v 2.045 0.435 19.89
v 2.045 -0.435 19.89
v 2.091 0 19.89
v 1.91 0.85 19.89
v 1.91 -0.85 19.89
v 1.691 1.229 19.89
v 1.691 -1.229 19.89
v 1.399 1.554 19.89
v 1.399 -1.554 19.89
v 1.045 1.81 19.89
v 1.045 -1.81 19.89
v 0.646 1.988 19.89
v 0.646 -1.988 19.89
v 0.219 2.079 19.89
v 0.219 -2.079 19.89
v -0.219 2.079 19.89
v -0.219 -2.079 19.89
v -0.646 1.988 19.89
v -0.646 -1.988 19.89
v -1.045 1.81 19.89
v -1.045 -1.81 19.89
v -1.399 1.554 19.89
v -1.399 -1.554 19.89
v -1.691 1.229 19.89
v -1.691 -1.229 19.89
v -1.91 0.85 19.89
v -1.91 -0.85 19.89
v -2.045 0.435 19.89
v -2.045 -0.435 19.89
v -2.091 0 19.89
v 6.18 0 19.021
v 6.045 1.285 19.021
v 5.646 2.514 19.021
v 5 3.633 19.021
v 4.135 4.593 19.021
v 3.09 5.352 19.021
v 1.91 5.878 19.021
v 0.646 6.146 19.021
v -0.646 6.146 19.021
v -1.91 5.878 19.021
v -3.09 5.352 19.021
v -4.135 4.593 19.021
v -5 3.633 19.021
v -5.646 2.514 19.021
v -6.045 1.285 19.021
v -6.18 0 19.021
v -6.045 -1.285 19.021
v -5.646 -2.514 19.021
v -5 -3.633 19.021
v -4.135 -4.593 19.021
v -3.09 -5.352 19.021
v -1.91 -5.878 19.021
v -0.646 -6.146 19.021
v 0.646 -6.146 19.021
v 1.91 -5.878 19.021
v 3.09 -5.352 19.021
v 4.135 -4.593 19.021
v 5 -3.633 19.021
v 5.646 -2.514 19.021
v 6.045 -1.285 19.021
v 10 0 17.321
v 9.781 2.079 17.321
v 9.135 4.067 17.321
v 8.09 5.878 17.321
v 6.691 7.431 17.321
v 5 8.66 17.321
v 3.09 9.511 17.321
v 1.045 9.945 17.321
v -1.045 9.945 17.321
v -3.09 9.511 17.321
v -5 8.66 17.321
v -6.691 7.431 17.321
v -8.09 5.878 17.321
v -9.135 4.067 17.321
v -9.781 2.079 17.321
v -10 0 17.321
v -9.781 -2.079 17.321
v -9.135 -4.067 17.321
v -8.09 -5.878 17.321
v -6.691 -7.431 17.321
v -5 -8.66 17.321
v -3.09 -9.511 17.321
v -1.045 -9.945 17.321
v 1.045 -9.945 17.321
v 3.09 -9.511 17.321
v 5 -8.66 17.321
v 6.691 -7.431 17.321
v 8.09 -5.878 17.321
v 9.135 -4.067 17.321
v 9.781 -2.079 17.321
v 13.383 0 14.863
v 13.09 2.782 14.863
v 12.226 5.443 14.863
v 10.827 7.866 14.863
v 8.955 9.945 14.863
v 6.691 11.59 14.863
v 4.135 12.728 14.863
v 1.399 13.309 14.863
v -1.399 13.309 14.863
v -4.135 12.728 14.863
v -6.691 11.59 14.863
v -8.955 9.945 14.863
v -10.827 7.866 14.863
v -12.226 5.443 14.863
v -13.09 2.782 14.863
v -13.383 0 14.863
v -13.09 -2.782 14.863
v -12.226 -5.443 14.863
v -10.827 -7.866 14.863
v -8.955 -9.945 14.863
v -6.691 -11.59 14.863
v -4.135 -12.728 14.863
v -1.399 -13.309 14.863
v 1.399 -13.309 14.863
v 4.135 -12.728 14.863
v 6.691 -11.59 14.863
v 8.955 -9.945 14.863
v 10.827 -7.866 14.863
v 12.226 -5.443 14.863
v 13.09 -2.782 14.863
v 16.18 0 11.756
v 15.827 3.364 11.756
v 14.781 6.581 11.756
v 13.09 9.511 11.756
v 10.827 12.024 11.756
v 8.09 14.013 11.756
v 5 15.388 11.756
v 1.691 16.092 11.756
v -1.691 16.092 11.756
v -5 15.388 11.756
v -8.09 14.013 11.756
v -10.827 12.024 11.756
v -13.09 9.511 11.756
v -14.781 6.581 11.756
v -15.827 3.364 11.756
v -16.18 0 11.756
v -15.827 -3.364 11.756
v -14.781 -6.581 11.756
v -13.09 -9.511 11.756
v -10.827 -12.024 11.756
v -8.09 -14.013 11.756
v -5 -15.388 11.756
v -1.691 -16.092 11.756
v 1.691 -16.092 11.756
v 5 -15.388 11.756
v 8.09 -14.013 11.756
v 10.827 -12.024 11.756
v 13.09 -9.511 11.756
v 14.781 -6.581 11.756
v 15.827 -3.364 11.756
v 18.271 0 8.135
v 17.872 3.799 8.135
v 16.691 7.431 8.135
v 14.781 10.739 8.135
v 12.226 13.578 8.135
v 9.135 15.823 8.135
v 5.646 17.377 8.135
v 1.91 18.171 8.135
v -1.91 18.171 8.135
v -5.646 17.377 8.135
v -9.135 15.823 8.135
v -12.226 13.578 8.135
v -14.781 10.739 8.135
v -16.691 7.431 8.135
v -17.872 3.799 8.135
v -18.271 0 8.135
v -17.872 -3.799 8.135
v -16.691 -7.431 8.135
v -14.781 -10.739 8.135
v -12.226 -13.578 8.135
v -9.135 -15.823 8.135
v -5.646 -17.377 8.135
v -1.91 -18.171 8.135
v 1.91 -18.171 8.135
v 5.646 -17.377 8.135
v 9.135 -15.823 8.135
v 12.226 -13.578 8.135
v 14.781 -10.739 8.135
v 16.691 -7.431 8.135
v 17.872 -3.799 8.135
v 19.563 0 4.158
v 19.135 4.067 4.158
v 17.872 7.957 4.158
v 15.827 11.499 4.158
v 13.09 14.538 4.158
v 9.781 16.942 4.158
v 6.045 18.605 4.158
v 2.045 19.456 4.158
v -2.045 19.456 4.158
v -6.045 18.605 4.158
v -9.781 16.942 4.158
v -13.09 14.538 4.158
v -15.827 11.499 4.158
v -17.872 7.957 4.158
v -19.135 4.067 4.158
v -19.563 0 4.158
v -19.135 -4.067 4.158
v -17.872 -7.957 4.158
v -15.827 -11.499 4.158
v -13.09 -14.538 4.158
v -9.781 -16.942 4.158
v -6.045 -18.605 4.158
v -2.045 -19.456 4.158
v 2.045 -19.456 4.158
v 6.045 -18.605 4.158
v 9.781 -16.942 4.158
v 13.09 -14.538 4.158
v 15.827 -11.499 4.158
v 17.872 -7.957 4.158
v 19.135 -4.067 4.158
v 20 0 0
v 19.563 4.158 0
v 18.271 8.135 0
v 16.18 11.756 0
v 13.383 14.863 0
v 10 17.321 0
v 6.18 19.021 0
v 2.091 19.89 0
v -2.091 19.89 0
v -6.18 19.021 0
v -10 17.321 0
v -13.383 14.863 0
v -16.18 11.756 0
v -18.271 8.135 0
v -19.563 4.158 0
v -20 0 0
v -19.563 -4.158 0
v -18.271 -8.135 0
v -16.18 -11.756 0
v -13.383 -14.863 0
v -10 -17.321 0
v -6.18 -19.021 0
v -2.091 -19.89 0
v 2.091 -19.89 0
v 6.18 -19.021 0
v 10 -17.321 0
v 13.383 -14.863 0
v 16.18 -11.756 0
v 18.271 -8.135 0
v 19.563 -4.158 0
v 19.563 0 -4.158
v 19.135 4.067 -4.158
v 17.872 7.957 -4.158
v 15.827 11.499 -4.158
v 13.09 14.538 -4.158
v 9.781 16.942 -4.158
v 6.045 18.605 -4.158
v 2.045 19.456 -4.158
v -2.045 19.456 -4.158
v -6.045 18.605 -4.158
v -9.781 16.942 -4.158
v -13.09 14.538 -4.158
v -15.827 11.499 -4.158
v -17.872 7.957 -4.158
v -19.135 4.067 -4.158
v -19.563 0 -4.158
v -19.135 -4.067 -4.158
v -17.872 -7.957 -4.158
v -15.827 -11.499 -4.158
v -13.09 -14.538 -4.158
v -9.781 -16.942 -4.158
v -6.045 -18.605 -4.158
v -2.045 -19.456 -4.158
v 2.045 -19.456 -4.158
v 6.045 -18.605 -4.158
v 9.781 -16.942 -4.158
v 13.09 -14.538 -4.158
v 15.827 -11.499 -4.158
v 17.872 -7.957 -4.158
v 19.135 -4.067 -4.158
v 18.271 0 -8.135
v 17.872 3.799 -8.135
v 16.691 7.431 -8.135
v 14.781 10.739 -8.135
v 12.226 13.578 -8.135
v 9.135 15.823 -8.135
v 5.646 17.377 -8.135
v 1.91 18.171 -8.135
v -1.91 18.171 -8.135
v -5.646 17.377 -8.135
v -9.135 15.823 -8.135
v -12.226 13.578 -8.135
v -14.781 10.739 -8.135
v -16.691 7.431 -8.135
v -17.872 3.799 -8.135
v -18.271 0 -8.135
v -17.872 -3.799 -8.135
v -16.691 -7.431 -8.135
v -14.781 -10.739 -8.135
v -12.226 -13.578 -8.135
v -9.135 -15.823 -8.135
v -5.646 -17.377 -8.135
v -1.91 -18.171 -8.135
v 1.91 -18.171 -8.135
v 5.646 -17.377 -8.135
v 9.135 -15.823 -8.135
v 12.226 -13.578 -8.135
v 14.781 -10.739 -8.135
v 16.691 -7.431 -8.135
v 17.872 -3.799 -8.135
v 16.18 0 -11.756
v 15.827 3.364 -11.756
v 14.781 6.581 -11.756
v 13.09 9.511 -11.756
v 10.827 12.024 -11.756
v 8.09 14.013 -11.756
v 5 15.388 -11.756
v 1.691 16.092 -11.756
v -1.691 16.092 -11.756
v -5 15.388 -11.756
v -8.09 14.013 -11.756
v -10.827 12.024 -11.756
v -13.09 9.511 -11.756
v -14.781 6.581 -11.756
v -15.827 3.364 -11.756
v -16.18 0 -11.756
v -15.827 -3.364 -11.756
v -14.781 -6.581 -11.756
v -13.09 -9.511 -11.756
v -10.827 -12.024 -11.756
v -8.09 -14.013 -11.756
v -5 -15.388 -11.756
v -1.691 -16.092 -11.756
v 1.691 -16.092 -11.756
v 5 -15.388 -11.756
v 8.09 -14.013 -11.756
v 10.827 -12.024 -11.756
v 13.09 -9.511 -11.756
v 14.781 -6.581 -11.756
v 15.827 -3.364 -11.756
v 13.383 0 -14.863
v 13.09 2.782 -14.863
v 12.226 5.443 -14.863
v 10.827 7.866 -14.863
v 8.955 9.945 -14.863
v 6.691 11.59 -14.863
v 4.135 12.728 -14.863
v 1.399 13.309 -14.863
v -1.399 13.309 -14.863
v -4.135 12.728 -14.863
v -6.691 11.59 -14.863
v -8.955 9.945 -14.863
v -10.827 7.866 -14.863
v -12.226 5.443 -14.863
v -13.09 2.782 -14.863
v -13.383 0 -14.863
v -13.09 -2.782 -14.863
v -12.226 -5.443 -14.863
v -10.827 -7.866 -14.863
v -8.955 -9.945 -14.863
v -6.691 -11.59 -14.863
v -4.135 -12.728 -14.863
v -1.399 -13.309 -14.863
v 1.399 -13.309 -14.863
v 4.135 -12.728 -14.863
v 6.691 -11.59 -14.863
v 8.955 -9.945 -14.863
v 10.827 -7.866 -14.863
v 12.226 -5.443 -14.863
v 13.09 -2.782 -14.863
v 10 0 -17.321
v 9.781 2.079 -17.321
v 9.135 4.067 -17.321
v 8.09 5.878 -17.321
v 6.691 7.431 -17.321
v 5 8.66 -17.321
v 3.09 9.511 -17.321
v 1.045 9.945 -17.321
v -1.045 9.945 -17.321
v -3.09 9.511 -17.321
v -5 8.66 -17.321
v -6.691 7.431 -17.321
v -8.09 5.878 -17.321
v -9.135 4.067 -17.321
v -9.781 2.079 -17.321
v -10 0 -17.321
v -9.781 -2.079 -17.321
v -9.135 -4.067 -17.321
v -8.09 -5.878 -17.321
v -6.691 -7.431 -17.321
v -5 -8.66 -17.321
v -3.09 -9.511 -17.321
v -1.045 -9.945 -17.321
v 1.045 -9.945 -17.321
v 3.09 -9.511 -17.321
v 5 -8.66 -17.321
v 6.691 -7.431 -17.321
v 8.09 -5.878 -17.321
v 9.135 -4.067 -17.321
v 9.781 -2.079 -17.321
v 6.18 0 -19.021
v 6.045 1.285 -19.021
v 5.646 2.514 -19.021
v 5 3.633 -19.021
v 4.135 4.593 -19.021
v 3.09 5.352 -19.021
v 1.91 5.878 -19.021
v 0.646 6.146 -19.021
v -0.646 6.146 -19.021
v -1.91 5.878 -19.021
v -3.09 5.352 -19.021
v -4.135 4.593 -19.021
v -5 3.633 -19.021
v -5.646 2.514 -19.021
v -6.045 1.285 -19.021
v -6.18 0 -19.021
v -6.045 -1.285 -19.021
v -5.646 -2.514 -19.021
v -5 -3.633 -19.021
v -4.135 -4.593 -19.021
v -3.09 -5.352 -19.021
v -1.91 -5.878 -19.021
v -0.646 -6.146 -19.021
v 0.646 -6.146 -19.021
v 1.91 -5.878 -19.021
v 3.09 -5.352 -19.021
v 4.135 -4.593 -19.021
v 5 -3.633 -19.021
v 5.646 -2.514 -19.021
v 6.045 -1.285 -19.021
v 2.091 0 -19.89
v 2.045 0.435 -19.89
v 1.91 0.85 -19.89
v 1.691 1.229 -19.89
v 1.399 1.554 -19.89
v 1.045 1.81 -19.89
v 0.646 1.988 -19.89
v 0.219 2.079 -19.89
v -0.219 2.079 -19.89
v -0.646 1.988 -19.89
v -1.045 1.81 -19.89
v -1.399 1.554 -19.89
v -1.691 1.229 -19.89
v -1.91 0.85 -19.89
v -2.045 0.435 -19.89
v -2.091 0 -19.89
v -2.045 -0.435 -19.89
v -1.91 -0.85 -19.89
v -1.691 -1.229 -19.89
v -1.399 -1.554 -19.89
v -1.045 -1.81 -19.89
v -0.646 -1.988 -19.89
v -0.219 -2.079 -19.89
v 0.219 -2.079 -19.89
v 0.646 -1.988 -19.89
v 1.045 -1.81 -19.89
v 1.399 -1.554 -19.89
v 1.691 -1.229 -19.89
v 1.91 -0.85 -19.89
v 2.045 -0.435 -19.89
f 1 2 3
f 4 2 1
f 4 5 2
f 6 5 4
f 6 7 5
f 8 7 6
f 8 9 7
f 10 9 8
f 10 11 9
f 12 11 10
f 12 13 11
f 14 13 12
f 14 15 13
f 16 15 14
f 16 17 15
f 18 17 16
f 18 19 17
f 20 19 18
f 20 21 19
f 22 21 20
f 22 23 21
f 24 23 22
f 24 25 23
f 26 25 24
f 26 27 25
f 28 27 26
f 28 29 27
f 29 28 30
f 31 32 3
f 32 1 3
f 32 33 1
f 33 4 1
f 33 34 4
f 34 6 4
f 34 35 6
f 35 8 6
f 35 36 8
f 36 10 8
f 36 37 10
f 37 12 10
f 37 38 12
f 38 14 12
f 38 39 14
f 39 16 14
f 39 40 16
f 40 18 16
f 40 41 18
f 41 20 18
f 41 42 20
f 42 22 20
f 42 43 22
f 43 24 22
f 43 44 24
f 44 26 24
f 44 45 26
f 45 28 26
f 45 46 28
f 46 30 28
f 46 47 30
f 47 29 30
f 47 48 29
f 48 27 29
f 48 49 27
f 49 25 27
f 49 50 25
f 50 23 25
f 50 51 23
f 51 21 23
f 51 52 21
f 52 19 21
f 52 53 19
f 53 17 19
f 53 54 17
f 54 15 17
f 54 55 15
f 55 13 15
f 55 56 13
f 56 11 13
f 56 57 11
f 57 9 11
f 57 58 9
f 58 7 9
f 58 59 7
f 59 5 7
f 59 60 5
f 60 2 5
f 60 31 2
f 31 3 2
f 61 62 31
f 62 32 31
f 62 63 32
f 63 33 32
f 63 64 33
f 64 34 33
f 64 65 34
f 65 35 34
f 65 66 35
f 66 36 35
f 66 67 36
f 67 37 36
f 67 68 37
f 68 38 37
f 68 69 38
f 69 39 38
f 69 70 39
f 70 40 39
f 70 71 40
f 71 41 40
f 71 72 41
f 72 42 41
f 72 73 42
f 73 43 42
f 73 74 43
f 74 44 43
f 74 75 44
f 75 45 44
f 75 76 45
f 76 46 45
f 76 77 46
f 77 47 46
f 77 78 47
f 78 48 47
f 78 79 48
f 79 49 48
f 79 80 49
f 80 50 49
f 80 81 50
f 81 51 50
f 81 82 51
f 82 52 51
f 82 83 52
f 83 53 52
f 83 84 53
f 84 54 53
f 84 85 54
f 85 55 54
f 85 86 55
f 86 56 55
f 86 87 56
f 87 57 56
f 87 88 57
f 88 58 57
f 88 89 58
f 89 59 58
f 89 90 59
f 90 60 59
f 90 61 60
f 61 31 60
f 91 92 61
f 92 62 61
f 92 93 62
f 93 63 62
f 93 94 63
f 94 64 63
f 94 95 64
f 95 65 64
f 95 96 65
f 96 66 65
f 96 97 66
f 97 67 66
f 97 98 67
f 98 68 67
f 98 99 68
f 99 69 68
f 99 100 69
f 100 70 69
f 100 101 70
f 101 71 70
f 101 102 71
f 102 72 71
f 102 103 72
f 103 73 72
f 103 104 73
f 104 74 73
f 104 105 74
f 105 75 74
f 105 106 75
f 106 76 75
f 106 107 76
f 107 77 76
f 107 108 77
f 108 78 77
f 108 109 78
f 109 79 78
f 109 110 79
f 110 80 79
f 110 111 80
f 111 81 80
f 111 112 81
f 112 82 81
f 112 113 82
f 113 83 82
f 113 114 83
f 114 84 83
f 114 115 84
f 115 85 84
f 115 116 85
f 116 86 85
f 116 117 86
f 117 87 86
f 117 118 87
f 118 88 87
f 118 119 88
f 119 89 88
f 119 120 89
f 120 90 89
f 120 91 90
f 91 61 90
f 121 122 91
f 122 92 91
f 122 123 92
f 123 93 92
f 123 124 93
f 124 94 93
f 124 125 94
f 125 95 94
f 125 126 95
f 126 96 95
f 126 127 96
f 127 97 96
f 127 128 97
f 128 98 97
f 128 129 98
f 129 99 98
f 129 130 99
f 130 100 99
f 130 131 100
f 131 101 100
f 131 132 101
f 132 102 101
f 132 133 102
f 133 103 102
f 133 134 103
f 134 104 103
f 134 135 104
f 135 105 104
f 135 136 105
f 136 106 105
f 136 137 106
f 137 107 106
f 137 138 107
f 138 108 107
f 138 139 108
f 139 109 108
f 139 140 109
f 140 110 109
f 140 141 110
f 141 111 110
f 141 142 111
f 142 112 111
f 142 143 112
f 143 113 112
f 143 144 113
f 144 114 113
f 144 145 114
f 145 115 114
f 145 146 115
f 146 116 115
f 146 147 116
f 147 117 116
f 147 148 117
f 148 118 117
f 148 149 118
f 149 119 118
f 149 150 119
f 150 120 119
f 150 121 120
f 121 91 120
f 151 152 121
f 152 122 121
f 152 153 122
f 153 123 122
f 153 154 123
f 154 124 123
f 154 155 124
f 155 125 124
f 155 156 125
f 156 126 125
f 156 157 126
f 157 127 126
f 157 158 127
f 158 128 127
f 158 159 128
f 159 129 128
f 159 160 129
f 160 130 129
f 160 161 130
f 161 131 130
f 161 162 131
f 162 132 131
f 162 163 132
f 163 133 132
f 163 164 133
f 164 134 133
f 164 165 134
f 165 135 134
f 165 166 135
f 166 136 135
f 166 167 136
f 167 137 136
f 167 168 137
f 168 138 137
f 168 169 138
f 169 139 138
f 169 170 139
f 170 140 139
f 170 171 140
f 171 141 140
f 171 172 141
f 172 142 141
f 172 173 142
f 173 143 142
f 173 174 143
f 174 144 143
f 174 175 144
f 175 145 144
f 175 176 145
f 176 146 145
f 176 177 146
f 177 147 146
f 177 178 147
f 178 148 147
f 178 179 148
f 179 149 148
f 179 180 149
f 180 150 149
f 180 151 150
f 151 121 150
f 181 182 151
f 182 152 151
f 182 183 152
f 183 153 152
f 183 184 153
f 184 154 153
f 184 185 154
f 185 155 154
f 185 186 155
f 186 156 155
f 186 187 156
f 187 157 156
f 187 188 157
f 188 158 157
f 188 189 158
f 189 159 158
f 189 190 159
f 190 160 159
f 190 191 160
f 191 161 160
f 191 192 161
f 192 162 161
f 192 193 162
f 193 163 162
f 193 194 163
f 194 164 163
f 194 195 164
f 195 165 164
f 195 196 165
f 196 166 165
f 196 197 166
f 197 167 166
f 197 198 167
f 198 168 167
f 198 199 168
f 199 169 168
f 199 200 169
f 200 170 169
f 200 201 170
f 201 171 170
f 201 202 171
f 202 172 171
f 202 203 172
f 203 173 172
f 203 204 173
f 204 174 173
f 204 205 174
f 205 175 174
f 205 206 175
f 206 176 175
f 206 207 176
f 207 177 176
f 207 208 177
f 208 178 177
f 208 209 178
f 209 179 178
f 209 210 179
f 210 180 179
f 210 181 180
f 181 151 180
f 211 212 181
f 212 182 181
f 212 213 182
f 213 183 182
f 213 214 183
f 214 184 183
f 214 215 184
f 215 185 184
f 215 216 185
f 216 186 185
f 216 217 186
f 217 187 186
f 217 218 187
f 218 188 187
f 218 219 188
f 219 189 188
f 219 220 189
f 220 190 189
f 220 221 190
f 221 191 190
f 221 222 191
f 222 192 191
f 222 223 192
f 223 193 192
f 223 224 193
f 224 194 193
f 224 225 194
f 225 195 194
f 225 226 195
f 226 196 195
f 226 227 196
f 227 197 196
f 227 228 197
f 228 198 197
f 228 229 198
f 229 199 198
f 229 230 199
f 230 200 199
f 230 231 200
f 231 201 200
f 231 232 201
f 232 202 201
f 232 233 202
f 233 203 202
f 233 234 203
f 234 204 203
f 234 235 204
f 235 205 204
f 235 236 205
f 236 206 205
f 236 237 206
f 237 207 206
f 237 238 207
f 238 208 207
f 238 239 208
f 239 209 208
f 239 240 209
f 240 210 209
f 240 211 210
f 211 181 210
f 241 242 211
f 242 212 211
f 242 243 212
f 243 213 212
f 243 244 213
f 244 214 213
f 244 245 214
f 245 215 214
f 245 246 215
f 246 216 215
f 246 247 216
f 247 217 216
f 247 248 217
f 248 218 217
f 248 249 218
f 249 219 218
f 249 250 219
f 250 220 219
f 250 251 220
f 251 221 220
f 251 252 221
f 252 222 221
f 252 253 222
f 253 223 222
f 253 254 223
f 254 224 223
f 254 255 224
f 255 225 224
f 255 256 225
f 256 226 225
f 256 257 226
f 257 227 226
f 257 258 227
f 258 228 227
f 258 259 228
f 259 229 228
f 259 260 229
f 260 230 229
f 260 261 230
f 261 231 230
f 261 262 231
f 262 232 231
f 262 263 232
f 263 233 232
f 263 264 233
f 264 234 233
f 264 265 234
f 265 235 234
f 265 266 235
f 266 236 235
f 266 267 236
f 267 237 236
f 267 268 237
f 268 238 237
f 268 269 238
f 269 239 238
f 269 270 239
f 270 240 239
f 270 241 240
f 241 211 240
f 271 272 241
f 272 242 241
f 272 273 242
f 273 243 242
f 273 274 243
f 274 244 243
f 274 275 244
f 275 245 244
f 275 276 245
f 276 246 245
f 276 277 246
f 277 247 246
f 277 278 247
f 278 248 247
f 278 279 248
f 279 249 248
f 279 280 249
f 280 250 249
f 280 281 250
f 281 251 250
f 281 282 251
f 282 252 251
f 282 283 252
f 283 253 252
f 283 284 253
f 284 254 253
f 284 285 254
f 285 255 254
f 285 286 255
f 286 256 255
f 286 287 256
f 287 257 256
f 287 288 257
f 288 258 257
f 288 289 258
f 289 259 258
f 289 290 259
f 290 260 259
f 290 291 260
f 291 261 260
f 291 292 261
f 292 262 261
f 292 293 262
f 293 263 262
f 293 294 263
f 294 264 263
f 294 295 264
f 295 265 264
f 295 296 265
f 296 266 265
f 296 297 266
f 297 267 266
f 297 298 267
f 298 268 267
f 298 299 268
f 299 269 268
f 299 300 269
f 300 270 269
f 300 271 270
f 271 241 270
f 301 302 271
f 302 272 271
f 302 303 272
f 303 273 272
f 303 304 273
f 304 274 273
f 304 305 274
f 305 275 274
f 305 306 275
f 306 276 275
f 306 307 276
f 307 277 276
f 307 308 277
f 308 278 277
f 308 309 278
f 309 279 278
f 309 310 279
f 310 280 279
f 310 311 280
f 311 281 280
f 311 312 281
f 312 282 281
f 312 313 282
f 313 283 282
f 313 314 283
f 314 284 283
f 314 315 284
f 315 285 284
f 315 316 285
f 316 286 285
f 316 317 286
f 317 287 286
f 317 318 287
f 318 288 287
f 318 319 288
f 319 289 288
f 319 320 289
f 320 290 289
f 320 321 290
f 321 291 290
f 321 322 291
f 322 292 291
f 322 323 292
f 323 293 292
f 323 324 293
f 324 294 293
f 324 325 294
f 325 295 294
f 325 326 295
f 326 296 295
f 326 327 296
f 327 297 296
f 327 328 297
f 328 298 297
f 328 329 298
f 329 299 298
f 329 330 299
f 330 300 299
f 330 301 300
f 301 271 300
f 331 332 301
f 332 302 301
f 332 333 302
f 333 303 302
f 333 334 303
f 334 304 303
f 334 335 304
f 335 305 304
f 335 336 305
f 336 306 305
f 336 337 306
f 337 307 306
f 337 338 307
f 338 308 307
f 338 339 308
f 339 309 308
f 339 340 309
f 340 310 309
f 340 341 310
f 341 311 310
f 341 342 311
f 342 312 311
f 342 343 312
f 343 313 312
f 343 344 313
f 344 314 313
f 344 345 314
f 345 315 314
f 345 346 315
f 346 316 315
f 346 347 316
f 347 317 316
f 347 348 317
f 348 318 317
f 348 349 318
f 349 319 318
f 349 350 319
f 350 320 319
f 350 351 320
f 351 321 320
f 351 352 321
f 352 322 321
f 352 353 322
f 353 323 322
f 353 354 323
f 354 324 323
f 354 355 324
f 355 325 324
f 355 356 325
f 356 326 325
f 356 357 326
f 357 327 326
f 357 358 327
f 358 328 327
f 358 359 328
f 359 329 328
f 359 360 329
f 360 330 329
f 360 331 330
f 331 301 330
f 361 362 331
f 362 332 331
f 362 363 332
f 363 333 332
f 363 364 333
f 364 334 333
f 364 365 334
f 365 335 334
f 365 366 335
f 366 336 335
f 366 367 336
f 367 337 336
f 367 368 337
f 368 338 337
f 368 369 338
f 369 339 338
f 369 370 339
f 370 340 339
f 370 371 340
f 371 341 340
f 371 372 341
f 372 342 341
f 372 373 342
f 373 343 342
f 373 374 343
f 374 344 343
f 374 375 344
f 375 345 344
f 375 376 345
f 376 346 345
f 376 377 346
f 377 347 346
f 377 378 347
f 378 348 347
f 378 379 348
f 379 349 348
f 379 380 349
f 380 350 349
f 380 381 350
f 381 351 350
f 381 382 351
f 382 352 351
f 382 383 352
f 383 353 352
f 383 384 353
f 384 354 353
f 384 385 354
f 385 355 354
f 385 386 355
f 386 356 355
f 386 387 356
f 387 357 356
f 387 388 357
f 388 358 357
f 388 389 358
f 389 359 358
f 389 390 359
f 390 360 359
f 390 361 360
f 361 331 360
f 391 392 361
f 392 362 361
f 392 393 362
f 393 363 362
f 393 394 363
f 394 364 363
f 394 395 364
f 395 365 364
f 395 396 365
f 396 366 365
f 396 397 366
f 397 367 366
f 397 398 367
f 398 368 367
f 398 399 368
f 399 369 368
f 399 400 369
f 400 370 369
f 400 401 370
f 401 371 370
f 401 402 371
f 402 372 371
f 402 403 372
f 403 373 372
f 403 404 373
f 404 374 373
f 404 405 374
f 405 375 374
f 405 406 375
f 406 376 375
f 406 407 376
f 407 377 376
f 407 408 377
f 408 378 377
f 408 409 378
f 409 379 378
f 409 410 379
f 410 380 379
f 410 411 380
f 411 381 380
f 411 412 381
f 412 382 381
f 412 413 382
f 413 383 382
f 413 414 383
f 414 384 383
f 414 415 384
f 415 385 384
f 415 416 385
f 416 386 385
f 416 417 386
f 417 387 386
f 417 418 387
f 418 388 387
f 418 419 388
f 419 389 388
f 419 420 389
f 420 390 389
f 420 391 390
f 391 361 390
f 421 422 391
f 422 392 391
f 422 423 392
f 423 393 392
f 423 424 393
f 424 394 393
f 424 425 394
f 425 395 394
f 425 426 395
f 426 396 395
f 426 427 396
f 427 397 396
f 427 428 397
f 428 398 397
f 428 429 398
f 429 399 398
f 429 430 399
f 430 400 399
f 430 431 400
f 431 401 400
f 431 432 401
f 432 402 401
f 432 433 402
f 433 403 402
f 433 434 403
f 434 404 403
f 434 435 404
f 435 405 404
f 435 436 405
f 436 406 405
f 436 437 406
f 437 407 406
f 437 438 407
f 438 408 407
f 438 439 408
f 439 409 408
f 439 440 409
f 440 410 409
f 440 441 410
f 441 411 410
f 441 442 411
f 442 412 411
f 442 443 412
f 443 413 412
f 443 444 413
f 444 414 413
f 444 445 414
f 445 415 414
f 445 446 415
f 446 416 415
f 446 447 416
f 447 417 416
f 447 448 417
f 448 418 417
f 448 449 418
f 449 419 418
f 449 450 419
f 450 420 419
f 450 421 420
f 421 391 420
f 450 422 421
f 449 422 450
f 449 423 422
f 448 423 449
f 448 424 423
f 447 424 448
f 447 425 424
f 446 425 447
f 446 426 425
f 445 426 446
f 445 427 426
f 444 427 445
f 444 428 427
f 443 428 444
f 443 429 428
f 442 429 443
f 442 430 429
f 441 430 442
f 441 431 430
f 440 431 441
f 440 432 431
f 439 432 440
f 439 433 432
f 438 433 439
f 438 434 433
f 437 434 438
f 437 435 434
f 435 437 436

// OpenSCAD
/*
    This is an OpenSCAD test project
    -------------------------------------------------
*/

radius_with_a_name = 20; // a very important radius parameter

// the main sphere of our model
sphere(r = radius_with_a_name);
